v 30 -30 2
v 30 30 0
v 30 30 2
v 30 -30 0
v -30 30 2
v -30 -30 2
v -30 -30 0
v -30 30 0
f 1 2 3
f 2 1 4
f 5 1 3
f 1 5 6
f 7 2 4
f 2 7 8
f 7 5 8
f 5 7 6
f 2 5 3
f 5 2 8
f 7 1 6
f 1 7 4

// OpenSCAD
logo = "RPiLogo.png"; // res 240 x 300

wid = 60; // Plate dim
logox = 200; 
logoy = 200; 

if (true) {
    translate([-30, -30, 0]) {
        difference() {
            cube([wid, wid, 2]);
            translate([wid/4, (wid/4) - 7, 3]) {
                scale([.5 * wid / logox, .5 * wid / logoy, .02]) {
                    surface(file=logo, invert=true);
                }
            }
        }
    }
} else {
    translate([-120, -150, 0]) {
        surface(file=logo, invert=true);
    }
}
